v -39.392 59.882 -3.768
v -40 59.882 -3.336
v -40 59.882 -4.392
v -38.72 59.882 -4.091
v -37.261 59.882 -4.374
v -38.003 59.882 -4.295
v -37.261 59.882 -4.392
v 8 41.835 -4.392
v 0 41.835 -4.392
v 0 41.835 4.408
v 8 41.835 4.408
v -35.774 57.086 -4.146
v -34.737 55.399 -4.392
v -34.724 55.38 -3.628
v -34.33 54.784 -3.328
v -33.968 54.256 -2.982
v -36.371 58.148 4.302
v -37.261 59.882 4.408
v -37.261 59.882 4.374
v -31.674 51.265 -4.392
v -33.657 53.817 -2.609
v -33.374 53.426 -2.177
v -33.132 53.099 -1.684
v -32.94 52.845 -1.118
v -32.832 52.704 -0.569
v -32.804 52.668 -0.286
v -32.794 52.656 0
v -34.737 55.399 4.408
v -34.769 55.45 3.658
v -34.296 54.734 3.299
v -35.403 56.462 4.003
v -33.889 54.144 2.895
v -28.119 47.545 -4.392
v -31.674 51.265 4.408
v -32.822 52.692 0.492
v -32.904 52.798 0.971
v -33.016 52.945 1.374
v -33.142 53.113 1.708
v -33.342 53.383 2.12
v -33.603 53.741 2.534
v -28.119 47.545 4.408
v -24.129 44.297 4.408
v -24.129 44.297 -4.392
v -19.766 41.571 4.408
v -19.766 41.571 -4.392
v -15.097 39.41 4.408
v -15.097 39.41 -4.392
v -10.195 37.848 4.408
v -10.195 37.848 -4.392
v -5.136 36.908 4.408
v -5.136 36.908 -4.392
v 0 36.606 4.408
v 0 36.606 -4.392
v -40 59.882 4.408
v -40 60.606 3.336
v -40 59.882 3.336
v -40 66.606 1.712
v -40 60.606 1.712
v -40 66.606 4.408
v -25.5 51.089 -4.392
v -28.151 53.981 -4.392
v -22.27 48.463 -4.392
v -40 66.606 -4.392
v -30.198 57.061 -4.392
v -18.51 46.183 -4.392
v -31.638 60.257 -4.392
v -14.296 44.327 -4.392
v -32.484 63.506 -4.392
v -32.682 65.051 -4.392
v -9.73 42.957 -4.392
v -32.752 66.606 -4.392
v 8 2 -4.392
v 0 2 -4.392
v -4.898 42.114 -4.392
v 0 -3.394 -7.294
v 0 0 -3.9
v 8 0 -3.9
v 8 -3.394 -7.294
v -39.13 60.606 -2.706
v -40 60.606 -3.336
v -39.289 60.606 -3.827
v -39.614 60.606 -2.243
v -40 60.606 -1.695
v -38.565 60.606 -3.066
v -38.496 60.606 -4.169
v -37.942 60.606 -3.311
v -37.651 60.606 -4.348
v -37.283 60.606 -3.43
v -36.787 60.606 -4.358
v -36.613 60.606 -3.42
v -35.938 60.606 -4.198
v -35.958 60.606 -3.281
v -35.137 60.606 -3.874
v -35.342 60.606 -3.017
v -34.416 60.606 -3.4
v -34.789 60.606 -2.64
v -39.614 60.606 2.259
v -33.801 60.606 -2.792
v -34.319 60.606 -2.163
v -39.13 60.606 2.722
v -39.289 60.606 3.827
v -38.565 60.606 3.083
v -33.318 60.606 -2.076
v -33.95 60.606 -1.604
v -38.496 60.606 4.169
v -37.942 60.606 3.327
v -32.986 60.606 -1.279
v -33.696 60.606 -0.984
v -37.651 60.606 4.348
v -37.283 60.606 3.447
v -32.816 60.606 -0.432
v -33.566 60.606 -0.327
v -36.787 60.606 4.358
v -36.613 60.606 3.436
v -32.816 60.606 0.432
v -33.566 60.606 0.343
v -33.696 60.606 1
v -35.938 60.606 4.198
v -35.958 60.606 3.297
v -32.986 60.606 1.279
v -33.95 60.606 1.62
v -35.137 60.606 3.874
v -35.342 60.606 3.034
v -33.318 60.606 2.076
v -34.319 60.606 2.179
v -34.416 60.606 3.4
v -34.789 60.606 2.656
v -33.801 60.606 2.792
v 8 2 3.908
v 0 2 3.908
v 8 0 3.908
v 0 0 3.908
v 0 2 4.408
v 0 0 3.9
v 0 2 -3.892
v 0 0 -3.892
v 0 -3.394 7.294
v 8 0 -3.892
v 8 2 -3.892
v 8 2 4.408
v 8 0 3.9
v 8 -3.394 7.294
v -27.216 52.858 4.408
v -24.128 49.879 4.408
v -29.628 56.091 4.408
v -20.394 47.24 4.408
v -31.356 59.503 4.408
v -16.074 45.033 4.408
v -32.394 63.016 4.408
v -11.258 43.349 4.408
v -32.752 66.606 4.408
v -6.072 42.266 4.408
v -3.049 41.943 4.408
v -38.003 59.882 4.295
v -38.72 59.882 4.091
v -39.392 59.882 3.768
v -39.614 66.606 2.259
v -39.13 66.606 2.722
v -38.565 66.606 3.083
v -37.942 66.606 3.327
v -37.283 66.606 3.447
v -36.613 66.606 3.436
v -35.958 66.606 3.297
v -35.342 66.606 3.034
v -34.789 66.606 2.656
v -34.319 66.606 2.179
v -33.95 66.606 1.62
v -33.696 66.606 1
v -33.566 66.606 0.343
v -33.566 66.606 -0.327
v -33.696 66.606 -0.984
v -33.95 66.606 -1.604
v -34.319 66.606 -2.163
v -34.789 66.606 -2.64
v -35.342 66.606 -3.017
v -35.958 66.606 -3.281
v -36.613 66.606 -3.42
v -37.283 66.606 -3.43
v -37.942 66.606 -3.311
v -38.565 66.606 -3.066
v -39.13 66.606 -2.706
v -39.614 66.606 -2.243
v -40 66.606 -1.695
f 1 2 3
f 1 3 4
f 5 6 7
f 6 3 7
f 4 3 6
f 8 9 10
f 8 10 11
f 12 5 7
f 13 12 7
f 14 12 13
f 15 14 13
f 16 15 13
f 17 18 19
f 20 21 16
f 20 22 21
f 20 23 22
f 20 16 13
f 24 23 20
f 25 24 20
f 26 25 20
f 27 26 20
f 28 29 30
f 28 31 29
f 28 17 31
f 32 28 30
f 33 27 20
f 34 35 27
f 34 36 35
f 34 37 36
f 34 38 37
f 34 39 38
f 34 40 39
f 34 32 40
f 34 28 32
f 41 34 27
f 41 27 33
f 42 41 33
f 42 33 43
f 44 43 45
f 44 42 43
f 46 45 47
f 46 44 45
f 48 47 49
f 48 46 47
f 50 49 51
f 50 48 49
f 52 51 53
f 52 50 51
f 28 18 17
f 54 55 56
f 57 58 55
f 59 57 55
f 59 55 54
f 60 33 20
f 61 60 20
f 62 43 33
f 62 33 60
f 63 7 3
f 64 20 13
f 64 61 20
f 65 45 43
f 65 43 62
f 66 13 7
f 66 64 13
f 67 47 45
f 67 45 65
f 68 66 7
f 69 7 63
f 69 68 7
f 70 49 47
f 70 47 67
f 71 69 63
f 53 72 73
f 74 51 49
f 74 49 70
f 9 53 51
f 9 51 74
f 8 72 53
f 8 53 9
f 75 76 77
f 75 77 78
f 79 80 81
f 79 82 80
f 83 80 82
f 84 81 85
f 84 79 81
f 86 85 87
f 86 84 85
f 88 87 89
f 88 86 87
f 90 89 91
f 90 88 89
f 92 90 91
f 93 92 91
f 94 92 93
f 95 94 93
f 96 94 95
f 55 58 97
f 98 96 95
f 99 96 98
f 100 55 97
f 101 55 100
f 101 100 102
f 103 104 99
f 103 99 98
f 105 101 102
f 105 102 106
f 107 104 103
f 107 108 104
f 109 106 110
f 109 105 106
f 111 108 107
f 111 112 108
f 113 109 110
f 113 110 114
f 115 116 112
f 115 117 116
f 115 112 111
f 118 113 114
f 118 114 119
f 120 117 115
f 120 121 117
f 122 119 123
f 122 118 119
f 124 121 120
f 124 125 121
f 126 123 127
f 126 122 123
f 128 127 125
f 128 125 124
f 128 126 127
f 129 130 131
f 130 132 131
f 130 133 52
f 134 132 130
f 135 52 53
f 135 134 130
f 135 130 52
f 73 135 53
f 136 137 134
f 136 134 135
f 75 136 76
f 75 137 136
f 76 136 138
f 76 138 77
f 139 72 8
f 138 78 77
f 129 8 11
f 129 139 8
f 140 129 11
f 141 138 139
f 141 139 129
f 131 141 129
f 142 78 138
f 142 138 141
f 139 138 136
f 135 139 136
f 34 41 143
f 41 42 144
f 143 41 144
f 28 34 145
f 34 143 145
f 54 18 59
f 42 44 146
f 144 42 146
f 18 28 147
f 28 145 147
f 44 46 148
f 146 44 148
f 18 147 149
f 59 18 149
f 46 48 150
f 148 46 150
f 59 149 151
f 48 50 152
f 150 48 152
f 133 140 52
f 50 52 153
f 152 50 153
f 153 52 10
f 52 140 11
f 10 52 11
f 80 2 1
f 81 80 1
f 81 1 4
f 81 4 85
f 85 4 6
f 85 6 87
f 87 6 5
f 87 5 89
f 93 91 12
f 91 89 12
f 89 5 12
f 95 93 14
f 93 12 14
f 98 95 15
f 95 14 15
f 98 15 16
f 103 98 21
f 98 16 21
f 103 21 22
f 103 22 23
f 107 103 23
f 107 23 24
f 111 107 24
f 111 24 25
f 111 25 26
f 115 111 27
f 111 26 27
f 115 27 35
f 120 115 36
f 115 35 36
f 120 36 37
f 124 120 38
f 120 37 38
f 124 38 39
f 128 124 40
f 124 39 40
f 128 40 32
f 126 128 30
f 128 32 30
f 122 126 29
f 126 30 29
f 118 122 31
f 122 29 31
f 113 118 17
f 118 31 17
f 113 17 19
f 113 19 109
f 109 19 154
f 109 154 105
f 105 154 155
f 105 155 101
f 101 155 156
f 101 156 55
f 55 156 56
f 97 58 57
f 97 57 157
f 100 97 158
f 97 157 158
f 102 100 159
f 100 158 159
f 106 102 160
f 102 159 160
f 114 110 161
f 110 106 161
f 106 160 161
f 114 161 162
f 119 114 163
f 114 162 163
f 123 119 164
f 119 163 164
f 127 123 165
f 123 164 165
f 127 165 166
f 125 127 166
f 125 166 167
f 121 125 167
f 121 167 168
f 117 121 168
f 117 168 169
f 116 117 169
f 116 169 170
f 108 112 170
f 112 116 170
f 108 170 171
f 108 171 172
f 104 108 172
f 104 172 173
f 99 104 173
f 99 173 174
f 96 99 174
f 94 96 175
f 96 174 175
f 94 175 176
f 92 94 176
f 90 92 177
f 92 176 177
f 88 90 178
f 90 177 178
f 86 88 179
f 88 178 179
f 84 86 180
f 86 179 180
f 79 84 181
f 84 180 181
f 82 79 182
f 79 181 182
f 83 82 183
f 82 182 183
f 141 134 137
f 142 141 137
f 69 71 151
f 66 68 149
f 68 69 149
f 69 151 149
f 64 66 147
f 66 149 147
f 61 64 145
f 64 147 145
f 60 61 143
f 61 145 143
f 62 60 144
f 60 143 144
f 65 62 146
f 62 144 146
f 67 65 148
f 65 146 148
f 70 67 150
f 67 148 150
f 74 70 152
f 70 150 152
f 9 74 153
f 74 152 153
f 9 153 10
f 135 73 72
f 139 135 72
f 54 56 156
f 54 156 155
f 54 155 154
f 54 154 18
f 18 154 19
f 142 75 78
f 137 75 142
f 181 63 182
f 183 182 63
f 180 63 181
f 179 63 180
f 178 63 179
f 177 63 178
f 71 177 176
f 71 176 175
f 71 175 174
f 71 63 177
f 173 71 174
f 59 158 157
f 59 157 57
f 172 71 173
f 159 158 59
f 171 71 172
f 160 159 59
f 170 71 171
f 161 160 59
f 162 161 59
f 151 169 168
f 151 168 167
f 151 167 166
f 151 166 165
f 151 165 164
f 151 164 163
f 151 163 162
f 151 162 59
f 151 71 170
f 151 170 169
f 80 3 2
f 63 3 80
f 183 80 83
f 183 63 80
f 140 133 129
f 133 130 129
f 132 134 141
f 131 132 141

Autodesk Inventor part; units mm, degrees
ref_plane "YZ Plane" through (0, 0, 0) normal (1, 0, 0) x (0, 1, 0)
ref_plane "XZ Plane" through (0, 0, 0) normal (0, 1, 0) x (-1, 0, 0)
ref_plane "XY Plane" through (0, 0, 0) normal (0, 0, 1) x (1, 0, 0)
sketch "Sketch1" plane through (0, 0, 0) normal (1, 0, 0) x (0, 1, 0)
  line L0 (0, 0) -> (0, 3.9)
  line L1 (0, 0) -> (0, -3.9)
  line L2 (0, 3.9) -> (-3.3941, 7.2941)
  line L3 (0, 3.9) -> (4.8, 3.9) construction
  line L4 (0, -3.9) -> (-3.3941, -7.2941)
  line L5 (0, -3.9) -> (4.8, -3.9) construction
  line L6 (-3.3941, -7.2941) -> (-3.3941, 7.2941)
  dimension "d0" = 3.9
  dimension "d1" = 3.9
  dimension "d2" = 4.8
  dimension "d3" = 135
  dimension "d4" = 4.8
  dimension "d5" = 135
extrude "Extrusion1" add sketch "Sketch1" along normal blind 8
sketch "Sketch2" plane through (0, 0, 3.9) normal (0, 1, 0) x (1, 0, 0)
  line L0 (0, -3.3941) -> (0, 11.1941) projected
  line L1 (0, -0.0082) -> (8, -0.0082)
  line L2 (8, -0.0082) -> (8, 7.7918)
  line L3 (8, 7.7918) -> (0, 7.7918)
  line L4 (0, 7.7918) -> (0, -0.0082)
  point P0 (0, 3.9)
  dimension "d8" = 8
  dimension "d9" = 7.8
extrude "Extrusion2" add sketch "Sketch2" along normal blind 2
sketch "Sketch3" plane through (0, 2, 3.9) normal (0, 1, 0) x (1, 0, 0)
  line L0 (8, -0.5082) -> (0, -0.5082)
  line L1 (0, -0.5082) -> (0, 8.2918)
  line L2 (0, 8.2918) -> (8, 8.2918)
  line L3 (8, 8.2918) -> (8, -0.5082)
  line L4 (8, -0.5082) -> (0, 8.2918) construction
  line L5 (0, -0.5082) -> (8, 8.2918) construction
  line L6 (8, 7.7918) -> (0, 7.7918) projected
  point P0 (0, 3.9)
  point P1 (4, 3.8918)
  dimension "d12" = 8
  dimension "d13" = 8.8
  dimension "d14" = 3.9
  dimension "d15" = 4
extrude "Extrusion3" add sketch "Sketch3" along normal blind 64.606
sketch "Sketch4" plane through (0, 0, 0) normal (-1, 0, 0) x (0, 0, 1)
  line L0 (-4.3918, 2) -> (-4.3918, 66.606) projected
  line L1 (4.4082, 2) -> (4.4082, 66.606) projected
  line L2 (-4.3918, 66.606) -> (4.4082, 66.606)
  line L3 (4.4082, 66.606) -> (4.4082, 36.606)
  line L4 (4.4082, 36.606) -> (-4.3918, 36.606)
  line L5 (-4.3918, 36.606) -> (-4.3918, 66.606)
  point P0 (0, 0)
  point P1 (-4.3918, 36.606)
  dimension "d18" = 30
extrude "Extrusion4" add sketch "Sketch4" along normal blind 40
sketch "Sketch5" plane through (0, 66.606, 3.9) normal (0, 1, 0) x (1, 0, 0)
  circle A0 centre (-37, 3.8918) radius 3.45
  line L0 (-40, -0.5082) -> (-40, 8.2918) projected
  point P0 (0, 3.9)
  point P1 (-40, 5.5955)
  point P2 (-40, 2.1882)
  dimension "d21" = 6.9
  dimension "d22" = 3
sketch "Sketch6" plane through (0, 2, 4.4082) normal (0, 0, 1) x (1, 0, 0)
  point P0 (0, -2)
sketch "Sketch7" plane through (0, 2, 4.4082) normal (0, 0, 1) x (1, 0, 0)
  point P0 (0, -2)
sketch "Sketch10" plane through (0, 2, 4.4082) normal (0, 0, 1) x (1, 0, 0)
  ellipse E0 centre (0, 64.6805) end of major axis (0, 39.8349) minor radius 32.7521
  line L0 (8, 64.606) -> (-40, 64.606) projected
  line L1 (0, 39.8349) -> (8, 39.8349)
  line L2 (8, 39.8349) -> (8, 64.606)
  line L3 (8, 64.606) -> (0, 64.606)
  line L4 (0, 64.606) -> (0, 39.8349)
  point P0 (0, -2)
  point P1 (8, 40.5875)
extrude "Extrusion8" cut sketch "Sketch10" against normal blind 10
sketch "Sketch13" plane through (0, 36.606, -4.3918) normal (0, -1, 0) x (1, 0, 0)
  circle A0 centre (-37.1694, 4.3918) radius 4.375
  point P0 (0, 4.3918)
  dimension "d37" = 8.75
extrude "Extrusion9" cut sketch "Sketch13" against normal blind 24
extrude "Extrusion10" cut sketch "Sketch5" against normal blind 24
sketch "Sketch14" plane through (8, 2, -4.3918) normal (0, 0, -1) x (-1, 0, 0)
  line L0 (48, 34.606) -> (40.7944, 34.606) projected
  line L1 (45.2609, 34.606) -> (48, 34.606)
  line L2 (48, 34.606) -> (48, 57.8825)
  line L3 (48, 57.8825) -> (45.2609, 57.8825)
  line L4 (45.2609, 57.8825) -> (45.2609, 34.606)
  point P0 (8, -2)
extrude "Extrusion11" cut sketch "Sketch14" against normal blind 24
sketch "Sketch15" plane through (0, 2, 4.4082) normal (0, 0, 1) x (1, 0, 0)
  line L0 (-37.2609, 57.8825) -> (-37.2609, 34.606) projected
  line L1 (0, 34.606) -> (-37.2609, 34.606) projected
  arc A0 (-37.2609, 57.8825) -> (0, 34.606) centre (-0.1523, 75.824) ccw
  point P0 (0, -2)
  point P1 (-0.3046, 34.606)
extrude "Extrusion12" cut sketch "Sketch15" against normal through all
properties part number "Pasteur_holderNEW"
